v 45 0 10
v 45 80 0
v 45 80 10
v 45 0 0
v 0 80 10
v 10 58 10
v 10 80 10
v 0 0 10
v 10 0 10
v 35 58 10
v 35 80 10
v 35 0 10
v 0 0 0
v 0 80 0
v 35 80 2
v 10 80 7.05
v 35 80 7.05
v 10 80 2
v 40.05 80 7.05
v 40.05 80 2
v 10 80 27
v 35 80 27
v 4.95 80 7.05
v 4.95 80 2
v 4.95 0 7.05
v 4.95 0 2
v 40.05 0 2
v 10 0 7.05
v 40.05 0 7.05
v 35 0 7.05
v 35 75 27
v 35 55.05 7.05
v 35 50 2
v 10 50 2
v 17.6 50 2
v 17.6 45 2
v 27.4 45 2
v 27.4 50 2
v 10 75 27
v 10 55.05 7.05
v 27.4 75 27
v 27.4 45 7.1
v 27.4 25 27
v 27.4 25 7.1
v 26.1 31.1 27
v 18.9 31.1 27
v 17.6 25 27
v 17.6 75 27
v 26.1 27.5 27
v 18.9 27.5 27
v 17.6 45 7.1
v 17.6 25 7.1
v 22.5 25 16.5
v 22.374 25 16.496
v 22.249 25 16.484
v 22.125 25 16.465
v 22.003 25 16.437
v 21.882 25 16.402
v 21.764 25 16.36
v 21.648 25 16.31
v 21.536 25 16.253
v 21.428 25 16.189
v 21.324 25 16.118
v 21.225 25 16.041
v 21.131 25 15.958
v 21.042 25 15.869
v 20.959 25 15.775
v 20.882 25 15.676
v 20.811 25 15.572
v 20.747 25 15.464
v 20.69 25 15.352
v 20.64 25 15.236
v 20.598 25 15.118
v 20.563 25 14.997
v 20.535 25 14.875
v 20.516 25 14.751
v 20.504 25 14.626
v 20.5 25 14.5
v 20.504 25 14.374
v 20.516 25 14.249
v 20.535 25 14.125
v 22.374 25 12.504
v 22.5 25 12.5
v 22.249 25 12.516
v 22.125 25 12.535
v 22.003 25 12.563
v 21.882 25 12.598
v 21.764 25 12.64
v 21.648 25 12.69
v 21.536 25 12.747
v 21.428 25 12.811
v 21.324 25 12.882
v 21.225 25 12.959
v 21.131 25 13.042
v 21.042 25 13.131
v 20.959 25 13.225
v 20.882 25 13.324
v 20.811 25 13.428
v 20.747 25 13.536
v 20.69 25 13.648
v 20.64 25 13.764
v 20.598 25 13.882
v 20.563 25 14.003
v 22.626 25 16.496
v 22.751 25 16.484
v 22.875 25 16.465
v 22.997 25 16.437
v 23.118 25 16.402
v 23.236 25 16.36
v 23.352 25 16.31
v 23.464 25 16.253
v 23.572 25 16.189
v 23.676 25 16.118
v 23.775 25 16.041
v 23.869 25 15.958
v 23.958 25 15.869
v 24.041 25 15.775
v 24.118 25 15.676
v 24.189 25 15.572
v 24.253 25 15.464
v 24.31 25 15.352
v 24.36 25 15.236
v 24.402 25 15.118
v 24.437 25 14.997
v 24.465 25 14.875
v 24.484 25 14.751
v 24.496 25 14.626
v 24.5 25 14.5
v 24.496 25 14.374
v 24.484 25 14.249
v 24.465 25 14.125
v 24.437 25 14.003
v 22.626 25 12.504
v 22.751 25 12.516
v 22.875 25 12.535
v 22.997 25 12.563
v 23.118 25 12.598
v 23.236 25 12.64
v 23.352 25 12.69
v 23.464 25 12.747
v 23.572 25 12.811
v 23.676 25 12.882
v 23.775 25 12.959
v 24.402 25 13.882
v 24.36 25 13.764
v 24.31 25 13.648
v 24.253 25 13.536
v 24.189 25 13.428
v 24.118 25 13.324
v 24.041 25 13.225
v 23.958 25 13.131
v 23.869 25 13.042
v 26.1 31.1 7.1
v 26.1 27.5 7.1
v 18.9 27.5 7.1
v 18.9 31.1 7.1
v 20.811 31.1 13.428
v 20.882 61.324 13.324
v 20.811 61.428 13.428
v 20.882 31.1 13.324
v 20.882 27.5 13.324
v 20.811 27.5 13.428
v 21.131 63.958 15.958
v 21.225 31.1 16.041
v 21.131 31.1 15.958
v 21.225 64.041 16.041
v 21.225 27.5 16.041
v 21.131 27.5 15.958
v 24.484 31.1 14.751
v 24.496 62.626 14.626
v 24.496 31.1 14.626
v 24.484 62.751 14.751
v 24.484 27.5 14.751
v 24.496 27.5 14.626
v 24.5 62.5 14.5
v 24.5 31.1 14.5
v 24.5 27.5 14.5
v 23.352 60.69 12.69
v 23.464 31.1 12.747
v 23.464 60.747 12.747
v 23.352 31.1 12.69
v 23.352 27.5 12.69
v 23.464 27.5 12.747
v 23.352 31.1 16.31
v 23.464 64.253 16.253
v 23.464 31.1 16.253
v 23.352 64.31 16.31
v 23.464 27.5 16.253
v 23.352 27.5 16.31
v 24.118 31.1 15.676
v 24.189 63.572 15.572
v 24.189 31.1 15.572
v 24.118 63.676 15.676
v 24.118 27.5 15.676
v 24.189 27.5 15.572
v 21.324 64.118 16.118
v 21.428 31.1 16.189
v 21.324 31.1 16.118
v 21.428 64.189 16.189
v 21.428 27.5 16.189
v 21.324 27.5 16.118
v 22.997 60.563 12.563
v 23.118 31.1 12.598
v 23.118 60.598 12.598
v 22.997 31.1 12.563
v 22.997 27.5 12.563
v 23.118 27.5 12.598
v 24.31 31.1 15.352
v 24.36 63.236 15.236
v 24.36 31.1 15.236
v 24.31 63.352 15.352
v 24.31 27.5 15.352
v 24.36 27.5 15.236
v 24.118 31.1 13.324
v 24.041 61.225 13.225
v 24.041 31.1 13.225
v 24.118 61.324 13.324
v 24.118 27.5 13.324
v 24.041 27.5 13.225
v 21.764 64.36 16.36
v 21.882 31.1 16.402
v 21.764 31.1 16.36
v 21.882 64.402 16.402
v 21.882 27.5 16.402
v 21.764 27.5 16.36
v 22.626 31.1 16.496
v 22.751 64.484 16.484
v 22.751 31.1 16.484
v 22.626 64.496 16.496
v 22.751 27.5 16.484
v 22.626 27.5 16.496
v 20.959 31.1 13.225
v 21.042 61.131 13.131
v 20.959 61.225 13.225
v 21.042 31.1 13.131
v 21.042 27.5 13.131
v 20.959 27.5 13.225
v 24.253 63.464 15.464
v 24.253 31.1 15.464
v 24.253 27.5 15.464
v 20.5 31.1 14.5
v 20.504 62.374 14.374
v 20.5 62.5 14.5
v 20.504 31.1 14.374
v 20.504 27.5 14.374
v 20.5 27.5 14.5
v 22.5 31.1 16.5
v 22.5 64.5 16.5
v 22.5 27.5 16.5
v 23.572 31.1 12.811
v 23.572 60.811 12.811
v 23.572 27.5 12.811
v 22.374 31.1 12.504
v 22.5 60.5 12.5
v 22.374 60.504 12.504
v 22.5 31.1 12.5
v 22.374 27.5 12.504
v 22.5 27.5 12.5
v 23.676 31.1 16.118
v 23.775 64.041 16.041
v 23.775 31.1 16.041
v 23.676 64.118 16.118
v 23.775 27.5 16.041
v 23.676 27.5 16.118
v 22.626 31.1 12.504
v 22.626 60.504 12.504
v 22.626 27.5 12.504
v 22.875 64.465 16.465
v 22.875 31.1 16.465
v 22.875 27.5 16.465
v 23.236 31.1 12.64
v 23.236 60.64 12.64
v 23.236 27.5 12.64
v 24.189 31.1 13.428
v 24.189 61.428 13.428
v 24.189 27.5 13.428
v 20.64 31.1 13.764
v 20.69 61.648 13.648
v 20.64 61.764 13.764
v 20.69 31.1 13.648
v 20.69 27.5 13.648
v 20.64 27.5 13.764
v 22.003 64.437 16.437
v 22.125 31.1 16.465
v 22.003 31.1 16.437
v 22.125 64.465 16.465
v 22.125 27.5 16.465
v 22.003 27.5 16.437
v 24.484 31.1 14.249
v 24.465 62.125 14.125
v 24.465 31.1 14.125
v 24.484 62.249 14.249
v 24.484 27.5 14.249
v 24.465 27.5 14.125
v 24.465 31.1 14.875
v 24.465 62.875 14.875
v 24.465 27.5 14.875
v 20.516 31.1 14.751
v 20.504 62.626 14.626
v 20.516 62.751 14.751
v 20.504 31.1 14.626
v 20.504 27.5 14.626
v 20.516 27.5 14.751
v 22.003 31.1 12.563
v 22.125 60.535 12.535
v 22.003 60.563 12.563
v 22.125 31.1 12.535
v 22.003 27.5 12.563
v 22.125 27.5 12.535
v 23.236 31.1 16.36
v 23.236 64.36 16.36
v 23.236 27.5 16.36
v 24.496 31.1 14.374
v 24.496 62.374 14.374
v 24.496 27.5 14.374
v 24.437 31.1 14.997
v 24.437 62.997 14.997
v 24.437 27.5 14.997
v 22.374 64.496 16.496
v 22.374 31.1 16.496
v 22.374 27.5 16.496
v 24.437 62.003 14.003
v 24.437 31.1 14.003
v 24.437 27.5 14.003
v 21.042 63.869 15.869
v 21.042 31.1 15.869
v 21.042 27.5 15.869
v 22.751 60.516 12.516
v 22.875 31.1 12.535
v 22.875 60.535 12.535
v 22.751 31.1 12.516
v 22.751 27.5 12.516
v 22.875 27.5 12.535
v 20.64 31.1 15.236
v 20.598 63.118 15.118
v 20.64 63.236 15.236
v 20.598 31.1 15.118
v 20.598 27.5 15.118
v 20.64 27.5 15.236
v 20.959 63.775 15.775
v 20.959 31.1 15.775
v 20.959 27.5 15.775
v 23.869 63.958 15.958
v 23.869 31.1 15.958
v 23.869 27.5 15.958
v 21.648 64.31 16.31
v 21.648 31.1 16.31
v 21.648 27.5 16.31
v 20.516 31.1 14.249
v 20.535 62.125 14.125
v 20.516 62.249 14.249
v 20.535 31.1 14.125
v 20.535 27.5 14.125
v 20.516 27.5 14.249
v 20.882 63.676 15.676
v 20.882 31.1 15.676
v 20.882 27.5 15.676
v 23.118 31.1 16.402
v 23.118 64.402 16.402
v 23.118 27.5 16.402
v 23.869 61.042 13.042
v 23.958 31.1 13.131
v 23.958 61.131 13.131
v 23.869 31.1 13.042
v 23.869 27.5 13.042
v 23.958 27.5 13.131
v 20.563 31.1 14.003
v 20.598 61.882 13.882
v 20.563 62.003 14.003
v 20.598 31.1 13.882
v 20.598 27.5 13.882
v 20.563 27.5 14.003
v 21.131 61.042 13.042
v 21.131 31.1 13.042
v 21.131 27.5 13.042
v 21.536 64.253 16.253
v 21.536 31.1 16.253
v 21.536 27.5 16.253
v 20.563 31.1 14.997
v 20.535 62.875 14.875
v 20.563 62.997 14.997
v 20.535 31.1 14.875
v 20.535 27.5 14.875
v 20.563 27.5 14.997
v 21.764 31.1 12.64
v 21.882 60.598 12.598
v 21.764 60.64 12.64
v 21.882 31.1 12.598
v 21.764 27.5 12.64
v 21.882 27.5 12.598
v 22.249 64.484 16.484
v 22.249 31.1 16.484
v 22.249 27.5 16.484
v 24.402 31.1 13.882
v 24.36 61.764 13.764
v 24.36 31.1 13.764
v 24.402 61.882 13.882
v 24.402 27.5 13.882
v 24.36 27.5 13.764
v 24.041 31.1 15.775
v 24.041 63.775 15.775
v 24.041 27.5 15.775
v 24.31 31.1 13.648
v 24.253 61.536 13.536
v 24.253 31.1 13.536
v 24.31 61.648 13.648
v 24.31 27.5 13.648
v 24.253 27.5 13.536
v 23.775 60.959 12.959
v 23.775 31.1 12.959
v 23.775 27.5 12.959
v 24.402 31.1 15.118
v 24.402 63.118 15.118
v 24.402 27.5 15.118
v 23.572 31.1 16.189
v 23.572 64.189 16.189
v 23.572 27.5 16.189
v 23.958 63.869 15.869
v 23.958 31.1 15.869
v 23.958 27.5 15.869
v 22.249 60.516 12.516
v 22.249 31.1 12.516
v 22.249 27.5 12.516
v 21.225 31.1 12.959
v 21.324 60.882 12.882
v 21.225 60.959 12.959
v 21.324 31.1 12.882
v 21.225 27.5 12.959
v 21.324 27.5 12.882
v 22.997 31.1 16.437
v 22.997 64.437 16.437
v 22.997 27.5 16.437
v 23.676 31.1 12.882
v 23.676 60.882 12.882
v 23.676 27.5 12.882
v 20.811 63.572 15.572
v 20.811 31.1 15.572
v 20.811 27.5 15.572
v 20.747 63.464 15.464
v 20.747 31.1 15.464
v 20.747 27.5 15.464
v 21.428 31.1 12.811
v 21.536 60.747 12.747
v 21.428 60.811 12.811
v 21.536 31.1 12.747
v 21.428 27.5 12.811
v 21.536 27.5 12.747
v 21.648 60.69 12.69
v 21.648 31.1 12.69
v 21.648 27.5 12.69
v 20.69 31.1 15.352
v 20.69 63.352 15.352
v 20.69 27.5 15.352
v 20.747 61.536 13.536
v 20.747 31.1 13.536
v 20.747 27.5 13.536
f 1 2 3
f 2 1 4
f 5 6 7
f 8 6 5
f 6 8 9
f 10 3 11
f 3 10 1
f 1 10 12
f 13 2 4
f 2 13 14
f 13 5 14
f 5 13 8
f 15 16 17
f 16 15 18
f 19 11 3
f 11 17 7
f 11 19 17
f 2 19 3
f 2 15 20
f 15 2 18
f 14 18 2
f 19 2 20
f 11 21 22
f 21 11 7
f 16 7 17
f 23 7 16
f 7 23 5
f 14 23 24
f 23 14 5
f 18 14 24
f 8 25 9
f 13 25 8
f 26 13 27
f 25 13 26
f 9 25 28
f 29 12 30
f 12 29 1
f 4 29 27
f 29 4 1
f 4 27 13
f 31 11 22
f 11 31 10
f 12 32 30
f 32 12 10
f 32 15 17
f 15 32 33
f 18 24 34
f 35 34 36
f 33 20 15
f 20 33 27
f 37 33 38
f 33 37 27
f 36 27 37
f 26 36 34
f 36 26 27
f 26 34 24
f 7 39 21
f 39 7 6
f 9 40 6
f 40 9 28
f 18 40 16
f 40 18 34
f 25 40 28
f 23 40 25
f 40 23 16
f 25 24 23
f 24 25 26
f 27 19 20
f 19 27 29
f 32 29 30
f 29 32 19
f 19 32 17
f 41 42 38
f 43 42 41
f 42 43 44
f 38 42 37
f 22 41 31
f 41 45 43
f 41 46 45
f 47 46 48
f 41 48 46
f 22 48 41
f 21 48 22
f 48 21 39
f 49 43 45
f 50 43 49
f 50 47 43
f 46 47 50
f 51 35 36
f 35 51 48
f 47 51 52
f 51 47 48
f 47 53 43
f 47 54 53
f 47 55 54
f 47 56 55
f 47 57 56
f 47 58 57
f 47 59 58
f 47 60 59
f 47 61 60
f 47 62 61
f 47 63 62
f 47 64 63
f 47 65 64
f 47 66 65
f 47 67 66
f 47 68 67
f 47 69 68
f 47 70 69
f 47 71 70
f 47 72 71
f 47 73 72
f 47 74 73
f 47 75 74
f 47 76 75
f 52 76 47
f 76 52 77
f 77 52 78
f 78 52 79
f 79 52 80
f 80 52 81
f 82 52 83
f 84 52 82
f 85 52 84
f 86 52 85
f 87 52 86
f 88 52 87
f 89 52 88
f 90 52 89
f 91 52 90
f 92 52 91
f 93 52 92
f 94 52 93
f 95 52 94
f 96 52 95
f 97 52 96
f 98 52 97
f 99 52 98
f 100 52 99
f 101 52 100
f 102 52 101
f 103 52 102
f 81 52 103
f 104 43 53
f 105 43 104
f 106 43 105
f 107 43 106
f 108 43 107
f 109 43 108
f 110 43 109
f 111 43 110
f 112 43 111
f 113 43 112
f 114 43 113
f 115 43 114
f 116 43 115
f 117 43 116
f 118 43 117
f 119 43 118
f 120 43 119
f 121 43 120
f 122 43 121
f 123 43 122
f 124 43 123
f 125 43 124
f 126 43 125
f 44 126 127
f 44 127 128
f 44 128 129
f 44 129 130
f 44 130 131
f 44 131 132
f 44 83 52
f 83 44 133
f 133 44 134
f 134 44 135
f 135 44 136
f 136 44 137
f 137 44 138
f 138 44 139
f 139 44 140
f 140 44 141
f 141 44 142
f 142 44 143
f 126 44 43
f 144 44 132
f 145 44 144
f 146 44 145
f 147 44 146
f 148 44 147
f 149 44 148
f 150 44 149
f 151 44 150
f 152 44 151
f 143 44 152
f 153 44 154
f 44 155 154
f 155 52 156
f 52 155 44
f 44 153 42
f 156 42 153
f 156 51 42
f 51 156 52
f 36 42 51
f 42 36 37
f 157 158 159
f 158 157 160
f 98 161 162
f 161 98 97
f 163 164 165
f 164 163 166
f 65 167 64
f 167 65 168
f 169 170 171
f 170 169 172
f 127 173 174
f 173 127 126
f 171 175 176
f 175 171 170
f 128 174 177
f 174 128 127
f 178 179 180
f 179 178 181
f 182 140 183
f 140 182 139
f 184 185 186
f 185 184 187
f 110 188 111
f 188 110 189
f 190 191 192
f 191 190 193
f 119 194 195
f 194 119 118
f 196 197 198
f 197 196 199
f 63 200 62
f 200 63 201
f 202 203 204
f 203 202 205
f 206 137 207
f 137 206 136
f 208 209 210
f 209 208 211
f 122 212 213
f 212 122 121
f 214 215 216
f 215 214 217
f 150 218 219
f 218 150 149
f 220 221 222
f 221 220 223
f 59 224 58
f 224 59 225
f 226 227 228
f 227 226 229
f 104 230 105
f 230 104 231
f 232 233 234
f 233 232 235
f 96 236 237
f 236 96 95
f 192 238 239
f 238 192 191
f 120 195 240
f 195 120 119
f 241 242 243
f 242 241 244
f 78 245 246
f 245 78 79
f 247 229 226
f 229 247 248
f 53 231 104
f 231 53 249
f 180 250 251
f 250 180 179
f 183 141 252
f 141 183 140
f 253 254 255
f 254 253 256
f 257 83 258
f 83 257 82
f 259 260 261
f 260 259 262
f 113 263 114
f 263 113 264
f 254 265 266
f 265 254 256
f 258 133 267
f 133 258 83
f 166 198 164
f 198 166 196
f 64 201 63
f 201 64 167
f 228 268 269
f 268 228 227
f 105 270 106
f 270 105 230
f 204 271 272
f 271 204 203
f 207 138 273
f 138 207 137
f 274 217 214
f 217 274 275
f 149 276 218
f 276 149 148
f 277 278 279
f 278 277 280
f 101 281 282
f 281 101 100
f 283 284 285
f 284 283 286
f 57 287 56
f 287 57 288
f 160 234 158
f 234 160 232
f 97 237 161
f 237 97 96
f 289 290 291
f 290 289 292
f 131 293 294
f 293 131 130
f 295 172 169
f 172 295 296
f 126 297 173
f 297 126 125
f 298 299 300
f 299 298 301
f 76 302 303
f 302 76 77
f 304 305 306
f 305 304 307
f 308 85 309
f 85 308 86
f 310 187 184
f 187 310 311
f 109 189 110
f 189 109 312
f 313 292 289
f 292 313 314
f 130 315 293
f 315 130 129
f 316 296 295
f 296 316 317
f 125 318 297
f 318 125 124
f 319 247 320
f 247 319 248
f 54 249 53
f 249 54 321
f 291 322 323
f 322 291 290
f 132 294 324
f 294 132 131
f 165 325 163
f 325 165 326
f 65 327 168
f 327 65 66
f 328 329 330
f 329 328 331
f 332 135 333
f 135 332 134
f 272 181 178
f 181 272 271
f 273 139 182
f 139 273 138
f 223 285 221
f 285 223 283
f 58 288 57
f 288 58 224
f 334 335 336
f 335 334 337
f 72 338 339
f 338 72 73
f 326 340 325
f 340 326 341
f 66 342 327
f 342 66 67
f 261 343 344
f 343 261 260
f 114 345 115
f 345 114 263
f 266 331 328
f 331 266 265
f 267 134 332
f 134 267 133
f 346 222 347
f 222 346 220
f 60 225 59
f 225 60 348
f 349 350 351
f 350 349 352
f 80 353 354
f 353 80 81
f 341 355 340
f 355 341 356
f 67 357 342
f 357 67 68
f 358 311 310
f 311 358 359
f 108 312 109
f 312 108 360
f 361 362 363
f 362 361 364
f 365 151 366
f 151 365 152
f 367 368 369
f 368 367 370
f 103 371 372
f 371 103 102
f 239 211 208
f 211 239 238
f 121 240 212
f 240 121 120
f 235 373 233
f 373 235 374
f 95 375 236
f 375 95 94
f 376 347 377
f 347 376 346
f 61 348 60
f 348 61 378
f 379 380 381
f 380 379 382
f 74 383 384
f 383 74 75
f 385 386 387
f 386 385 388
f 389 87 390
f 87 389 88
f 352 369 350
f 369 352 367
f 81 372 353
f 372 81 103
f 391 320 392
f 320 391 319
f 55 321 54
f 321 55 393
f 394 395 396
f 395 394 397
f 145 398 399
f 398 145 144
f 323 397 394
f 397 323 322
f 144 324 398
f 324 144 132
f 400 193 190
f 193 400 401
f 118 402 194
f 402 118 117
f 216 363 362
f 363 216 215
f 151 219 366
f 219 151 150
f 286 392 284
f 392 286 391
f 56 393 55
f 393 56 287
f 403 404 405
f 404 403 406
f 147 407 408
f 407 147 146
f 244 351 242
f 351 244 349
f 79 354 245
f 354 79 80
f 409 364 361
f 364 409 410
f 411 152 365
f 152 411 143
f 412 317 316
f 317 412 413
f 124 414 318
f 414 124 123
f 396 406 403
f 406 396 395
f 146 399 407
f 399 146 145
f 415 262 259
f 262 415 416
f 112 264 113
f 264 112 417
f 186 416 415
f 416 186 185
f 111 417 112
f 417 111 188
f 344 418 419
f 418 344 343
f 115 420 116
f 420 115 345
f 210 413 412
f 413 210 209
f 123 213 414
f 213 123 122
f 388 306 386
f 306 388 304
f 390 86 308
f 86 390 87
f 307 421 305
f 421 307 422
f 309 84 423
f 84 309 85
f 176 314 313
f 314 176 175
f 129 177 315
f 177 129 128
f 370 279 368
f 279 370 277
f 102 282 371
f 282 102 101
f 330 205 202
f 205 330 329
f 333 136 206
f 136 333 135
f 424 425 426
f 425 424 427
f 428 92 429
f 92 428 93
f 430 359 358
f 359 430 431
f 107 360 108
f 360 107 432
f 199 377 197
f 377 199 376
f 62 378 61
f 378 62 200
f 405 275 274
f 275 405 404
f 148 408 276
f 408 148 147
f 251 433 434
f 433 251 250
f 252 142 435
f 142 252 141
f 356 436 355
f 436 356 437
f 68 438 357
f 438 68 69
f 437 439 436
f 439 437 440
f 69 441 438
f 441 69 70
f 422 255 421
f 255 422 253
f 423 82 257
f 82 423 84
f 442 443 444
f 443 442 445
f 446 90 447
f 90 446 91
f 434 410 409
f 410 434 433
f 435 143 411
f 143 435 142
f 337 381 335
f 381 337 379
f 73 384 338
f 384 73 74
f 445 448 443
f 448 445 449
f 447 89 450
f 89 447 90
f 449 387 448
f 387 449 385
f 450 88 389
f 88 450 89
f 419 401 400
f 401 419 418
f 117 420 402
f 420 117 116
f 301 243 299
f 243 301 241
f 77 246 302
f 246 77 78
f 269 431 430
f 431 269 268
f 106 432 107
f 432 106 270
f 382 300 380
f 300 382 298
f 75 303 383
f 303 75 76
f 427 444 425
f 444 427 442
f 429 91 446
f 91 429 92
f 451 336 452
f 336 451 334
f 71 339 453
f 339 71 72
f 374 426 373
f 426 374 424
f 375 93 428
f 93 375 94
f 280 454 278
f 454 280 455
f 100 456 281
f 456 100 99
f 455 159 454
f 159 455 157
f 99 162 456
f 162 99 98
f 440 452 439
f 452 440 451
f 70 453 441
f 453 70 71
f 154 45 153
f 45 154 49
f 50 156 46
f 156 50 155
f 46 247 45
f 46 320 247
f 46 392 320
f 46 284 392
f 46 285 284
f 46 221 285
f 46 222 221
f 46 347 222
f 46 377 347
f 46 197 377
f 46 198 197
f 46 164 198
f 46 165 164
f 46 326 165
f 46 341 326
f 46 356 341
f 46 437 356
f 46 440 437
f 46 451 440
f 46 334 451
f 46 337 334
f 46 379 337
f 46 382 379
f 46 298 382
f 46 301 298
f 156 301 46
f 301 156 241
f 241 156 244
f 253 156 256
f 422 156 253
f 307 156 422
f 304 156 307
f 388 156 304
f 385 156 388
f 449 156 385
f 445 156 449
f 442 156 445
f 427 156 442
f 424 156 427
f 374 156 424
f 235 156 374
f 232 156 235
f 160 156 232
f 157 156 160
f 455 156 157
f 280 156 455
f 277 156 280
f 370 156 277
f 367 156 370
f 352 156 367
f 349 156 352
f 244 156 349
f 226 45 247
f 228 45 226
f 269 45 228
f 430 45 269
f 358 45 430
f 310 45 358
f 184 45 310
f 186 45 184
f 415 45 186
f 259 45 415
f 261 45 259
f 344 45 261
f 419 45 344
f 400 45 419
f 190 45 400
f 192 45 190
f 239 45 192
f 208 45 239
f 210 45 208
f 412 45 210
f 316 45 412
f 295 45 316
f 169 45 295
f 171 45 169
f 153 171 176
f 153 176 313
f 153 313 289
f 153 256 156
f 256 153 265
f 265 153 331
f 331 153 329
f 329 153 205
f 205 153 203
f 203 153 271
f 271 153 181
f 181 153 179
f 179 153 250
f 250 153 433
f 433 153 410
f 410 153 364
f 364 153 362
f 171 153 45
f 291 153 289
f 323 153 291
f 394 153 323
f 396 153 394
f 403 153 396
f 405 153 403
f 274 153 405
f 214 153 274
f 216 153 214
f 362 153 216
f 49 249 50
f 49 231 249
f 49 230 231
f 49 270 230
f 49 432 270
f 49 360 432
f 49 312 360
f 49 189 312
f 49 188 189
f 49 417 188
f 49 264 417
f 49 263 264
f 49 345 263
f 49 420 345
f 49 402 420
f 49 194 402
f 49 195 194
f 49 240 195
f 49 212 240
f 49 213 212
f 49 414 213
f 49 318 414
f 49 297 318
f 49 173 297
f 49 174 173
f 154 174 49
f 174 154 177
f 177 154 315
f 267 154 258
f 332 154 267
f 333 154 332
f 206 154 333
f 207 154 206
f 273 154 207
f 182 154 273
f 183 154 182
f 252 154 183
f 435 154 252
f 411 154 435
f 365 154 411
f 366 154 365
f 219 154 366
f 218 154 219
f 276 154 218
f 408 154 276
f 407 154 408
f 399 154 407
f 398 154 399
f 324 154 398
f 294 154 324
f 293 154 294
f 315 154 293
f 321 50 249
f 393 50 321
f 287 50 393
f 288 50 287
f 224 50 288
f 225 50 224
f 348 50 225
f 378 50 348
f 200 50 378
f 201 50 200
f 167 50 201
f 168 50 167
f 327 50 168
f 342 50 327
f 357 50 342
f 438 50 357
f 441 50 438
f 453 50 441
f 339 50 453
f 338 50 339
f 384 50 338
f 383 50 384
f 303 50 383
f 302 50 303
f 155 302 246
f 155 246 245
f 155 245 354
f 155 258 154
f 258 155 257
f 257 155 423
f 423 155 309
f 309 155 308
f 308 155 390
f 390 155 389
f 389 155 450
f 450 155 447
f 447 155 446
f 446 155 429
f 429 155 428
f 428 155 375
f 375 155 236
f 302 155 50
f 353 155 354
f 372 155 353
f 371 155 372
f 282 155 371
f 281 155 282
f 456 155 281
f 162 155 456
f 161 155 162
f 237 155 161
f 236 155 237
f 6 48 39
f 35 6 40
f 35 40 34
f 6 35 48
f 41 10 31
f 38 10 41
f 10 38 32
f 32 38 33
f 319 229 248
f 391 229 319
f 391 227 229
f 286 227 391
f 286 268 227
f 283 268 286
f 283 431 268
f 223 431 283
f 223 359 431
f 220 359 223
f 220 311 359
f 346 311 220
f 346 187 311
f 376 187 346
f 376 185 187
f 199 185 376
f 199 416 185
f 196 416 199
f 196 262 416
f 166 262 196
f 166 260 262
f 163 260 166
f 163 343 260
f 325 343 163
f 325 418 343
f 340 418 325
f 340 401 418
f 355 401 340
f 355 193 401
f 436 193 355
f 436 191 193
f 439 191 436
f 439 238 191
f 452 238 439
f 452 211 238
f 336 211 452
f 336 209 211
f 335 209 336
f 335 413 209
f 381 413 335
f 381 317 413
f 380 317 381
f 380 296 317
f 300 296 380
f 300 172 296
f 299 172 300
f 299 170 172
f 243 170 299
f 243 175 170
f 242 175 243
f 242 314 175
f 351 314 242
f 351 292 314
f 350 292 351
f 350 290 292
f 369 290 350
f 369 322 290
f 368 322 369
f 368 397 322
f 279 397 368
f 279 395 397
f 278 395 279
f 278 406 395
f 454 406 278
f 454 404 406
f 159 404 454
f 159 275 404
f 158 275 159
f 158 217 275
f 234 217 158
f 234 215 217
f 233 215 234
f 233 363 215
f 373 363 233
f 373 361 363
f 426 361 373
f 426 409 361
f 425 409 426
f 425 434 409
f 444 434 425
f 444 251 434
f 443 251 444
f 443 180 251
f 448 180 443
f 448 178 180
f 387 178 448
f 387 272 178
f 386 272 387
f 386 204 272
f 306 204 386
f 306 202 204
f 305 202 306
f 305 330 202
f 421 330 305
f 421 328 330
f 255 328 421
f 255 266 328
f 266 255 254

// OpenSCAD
ridge_width = 9.8;
ridge_cutout_height = 5.1;
wedge_width = 25;
rail_width = 5.05;
rail_height = 5.05;

// m4 nut
nut_width = 7.2;
nut_height = 3.6;

module prism(l, w, h){
      polyhedron(//pt 0        1        2        3        4        5
              points=[[0,0,0], [l,0,0], [l,w,0], [0,w,0], [0,w,h], [l,w,h]],
              faces=[[0,1,2,3],[5,4,3,2],[0,4,5,1],[0,3,4],[5,2,1]]
              );
}

union(){
    difference(){
        cube([45, 80, 10]);
        // main groove
        translate([10, -1, 2]) {
            cube([wedge_width, 82, 15]);
        }
        // rails
        translate([10-rail_width, -1, 2]) {
            cube([rail_width+0.2, 82, rail_height]);
        }
        translate([10+wedge_width-0.1, -1, 2]) {
            cube([rail_width+0.1, 82, rail_height]);
        }
    }
    translate([10, 50, 2]){
        // static wedge
        prism(25, 25, 25);
        translate([0, 25, 0]) {
            cube([25, 5, 25]);
        }
        // ridge
        translate([(wedge_width-ridge_width)/2, -25, 0]) {            
            difference(){
                cube([ridge_width, 50, 25]);
                // bottom cutout
                translate([-0.1, -0.1, 0]){
                    cube([ridge_width+0.2, 20+0.1, ridge_cutout_height]);
                }                
                // m4 screw hole
                translate([ridge_width/2, 60, 25/2]) {
                    rotate([90, 0, 0]) {
                        cylinder(d=4, h=70, $fn=100);
                    }
                }
                // nut hole
                translate([(ridge_width-nut_width)/2, 2.5, 2.5]) {
                    cube([nut_width, nut_height, 25]);
                }            
            }
        }        
    }
}
